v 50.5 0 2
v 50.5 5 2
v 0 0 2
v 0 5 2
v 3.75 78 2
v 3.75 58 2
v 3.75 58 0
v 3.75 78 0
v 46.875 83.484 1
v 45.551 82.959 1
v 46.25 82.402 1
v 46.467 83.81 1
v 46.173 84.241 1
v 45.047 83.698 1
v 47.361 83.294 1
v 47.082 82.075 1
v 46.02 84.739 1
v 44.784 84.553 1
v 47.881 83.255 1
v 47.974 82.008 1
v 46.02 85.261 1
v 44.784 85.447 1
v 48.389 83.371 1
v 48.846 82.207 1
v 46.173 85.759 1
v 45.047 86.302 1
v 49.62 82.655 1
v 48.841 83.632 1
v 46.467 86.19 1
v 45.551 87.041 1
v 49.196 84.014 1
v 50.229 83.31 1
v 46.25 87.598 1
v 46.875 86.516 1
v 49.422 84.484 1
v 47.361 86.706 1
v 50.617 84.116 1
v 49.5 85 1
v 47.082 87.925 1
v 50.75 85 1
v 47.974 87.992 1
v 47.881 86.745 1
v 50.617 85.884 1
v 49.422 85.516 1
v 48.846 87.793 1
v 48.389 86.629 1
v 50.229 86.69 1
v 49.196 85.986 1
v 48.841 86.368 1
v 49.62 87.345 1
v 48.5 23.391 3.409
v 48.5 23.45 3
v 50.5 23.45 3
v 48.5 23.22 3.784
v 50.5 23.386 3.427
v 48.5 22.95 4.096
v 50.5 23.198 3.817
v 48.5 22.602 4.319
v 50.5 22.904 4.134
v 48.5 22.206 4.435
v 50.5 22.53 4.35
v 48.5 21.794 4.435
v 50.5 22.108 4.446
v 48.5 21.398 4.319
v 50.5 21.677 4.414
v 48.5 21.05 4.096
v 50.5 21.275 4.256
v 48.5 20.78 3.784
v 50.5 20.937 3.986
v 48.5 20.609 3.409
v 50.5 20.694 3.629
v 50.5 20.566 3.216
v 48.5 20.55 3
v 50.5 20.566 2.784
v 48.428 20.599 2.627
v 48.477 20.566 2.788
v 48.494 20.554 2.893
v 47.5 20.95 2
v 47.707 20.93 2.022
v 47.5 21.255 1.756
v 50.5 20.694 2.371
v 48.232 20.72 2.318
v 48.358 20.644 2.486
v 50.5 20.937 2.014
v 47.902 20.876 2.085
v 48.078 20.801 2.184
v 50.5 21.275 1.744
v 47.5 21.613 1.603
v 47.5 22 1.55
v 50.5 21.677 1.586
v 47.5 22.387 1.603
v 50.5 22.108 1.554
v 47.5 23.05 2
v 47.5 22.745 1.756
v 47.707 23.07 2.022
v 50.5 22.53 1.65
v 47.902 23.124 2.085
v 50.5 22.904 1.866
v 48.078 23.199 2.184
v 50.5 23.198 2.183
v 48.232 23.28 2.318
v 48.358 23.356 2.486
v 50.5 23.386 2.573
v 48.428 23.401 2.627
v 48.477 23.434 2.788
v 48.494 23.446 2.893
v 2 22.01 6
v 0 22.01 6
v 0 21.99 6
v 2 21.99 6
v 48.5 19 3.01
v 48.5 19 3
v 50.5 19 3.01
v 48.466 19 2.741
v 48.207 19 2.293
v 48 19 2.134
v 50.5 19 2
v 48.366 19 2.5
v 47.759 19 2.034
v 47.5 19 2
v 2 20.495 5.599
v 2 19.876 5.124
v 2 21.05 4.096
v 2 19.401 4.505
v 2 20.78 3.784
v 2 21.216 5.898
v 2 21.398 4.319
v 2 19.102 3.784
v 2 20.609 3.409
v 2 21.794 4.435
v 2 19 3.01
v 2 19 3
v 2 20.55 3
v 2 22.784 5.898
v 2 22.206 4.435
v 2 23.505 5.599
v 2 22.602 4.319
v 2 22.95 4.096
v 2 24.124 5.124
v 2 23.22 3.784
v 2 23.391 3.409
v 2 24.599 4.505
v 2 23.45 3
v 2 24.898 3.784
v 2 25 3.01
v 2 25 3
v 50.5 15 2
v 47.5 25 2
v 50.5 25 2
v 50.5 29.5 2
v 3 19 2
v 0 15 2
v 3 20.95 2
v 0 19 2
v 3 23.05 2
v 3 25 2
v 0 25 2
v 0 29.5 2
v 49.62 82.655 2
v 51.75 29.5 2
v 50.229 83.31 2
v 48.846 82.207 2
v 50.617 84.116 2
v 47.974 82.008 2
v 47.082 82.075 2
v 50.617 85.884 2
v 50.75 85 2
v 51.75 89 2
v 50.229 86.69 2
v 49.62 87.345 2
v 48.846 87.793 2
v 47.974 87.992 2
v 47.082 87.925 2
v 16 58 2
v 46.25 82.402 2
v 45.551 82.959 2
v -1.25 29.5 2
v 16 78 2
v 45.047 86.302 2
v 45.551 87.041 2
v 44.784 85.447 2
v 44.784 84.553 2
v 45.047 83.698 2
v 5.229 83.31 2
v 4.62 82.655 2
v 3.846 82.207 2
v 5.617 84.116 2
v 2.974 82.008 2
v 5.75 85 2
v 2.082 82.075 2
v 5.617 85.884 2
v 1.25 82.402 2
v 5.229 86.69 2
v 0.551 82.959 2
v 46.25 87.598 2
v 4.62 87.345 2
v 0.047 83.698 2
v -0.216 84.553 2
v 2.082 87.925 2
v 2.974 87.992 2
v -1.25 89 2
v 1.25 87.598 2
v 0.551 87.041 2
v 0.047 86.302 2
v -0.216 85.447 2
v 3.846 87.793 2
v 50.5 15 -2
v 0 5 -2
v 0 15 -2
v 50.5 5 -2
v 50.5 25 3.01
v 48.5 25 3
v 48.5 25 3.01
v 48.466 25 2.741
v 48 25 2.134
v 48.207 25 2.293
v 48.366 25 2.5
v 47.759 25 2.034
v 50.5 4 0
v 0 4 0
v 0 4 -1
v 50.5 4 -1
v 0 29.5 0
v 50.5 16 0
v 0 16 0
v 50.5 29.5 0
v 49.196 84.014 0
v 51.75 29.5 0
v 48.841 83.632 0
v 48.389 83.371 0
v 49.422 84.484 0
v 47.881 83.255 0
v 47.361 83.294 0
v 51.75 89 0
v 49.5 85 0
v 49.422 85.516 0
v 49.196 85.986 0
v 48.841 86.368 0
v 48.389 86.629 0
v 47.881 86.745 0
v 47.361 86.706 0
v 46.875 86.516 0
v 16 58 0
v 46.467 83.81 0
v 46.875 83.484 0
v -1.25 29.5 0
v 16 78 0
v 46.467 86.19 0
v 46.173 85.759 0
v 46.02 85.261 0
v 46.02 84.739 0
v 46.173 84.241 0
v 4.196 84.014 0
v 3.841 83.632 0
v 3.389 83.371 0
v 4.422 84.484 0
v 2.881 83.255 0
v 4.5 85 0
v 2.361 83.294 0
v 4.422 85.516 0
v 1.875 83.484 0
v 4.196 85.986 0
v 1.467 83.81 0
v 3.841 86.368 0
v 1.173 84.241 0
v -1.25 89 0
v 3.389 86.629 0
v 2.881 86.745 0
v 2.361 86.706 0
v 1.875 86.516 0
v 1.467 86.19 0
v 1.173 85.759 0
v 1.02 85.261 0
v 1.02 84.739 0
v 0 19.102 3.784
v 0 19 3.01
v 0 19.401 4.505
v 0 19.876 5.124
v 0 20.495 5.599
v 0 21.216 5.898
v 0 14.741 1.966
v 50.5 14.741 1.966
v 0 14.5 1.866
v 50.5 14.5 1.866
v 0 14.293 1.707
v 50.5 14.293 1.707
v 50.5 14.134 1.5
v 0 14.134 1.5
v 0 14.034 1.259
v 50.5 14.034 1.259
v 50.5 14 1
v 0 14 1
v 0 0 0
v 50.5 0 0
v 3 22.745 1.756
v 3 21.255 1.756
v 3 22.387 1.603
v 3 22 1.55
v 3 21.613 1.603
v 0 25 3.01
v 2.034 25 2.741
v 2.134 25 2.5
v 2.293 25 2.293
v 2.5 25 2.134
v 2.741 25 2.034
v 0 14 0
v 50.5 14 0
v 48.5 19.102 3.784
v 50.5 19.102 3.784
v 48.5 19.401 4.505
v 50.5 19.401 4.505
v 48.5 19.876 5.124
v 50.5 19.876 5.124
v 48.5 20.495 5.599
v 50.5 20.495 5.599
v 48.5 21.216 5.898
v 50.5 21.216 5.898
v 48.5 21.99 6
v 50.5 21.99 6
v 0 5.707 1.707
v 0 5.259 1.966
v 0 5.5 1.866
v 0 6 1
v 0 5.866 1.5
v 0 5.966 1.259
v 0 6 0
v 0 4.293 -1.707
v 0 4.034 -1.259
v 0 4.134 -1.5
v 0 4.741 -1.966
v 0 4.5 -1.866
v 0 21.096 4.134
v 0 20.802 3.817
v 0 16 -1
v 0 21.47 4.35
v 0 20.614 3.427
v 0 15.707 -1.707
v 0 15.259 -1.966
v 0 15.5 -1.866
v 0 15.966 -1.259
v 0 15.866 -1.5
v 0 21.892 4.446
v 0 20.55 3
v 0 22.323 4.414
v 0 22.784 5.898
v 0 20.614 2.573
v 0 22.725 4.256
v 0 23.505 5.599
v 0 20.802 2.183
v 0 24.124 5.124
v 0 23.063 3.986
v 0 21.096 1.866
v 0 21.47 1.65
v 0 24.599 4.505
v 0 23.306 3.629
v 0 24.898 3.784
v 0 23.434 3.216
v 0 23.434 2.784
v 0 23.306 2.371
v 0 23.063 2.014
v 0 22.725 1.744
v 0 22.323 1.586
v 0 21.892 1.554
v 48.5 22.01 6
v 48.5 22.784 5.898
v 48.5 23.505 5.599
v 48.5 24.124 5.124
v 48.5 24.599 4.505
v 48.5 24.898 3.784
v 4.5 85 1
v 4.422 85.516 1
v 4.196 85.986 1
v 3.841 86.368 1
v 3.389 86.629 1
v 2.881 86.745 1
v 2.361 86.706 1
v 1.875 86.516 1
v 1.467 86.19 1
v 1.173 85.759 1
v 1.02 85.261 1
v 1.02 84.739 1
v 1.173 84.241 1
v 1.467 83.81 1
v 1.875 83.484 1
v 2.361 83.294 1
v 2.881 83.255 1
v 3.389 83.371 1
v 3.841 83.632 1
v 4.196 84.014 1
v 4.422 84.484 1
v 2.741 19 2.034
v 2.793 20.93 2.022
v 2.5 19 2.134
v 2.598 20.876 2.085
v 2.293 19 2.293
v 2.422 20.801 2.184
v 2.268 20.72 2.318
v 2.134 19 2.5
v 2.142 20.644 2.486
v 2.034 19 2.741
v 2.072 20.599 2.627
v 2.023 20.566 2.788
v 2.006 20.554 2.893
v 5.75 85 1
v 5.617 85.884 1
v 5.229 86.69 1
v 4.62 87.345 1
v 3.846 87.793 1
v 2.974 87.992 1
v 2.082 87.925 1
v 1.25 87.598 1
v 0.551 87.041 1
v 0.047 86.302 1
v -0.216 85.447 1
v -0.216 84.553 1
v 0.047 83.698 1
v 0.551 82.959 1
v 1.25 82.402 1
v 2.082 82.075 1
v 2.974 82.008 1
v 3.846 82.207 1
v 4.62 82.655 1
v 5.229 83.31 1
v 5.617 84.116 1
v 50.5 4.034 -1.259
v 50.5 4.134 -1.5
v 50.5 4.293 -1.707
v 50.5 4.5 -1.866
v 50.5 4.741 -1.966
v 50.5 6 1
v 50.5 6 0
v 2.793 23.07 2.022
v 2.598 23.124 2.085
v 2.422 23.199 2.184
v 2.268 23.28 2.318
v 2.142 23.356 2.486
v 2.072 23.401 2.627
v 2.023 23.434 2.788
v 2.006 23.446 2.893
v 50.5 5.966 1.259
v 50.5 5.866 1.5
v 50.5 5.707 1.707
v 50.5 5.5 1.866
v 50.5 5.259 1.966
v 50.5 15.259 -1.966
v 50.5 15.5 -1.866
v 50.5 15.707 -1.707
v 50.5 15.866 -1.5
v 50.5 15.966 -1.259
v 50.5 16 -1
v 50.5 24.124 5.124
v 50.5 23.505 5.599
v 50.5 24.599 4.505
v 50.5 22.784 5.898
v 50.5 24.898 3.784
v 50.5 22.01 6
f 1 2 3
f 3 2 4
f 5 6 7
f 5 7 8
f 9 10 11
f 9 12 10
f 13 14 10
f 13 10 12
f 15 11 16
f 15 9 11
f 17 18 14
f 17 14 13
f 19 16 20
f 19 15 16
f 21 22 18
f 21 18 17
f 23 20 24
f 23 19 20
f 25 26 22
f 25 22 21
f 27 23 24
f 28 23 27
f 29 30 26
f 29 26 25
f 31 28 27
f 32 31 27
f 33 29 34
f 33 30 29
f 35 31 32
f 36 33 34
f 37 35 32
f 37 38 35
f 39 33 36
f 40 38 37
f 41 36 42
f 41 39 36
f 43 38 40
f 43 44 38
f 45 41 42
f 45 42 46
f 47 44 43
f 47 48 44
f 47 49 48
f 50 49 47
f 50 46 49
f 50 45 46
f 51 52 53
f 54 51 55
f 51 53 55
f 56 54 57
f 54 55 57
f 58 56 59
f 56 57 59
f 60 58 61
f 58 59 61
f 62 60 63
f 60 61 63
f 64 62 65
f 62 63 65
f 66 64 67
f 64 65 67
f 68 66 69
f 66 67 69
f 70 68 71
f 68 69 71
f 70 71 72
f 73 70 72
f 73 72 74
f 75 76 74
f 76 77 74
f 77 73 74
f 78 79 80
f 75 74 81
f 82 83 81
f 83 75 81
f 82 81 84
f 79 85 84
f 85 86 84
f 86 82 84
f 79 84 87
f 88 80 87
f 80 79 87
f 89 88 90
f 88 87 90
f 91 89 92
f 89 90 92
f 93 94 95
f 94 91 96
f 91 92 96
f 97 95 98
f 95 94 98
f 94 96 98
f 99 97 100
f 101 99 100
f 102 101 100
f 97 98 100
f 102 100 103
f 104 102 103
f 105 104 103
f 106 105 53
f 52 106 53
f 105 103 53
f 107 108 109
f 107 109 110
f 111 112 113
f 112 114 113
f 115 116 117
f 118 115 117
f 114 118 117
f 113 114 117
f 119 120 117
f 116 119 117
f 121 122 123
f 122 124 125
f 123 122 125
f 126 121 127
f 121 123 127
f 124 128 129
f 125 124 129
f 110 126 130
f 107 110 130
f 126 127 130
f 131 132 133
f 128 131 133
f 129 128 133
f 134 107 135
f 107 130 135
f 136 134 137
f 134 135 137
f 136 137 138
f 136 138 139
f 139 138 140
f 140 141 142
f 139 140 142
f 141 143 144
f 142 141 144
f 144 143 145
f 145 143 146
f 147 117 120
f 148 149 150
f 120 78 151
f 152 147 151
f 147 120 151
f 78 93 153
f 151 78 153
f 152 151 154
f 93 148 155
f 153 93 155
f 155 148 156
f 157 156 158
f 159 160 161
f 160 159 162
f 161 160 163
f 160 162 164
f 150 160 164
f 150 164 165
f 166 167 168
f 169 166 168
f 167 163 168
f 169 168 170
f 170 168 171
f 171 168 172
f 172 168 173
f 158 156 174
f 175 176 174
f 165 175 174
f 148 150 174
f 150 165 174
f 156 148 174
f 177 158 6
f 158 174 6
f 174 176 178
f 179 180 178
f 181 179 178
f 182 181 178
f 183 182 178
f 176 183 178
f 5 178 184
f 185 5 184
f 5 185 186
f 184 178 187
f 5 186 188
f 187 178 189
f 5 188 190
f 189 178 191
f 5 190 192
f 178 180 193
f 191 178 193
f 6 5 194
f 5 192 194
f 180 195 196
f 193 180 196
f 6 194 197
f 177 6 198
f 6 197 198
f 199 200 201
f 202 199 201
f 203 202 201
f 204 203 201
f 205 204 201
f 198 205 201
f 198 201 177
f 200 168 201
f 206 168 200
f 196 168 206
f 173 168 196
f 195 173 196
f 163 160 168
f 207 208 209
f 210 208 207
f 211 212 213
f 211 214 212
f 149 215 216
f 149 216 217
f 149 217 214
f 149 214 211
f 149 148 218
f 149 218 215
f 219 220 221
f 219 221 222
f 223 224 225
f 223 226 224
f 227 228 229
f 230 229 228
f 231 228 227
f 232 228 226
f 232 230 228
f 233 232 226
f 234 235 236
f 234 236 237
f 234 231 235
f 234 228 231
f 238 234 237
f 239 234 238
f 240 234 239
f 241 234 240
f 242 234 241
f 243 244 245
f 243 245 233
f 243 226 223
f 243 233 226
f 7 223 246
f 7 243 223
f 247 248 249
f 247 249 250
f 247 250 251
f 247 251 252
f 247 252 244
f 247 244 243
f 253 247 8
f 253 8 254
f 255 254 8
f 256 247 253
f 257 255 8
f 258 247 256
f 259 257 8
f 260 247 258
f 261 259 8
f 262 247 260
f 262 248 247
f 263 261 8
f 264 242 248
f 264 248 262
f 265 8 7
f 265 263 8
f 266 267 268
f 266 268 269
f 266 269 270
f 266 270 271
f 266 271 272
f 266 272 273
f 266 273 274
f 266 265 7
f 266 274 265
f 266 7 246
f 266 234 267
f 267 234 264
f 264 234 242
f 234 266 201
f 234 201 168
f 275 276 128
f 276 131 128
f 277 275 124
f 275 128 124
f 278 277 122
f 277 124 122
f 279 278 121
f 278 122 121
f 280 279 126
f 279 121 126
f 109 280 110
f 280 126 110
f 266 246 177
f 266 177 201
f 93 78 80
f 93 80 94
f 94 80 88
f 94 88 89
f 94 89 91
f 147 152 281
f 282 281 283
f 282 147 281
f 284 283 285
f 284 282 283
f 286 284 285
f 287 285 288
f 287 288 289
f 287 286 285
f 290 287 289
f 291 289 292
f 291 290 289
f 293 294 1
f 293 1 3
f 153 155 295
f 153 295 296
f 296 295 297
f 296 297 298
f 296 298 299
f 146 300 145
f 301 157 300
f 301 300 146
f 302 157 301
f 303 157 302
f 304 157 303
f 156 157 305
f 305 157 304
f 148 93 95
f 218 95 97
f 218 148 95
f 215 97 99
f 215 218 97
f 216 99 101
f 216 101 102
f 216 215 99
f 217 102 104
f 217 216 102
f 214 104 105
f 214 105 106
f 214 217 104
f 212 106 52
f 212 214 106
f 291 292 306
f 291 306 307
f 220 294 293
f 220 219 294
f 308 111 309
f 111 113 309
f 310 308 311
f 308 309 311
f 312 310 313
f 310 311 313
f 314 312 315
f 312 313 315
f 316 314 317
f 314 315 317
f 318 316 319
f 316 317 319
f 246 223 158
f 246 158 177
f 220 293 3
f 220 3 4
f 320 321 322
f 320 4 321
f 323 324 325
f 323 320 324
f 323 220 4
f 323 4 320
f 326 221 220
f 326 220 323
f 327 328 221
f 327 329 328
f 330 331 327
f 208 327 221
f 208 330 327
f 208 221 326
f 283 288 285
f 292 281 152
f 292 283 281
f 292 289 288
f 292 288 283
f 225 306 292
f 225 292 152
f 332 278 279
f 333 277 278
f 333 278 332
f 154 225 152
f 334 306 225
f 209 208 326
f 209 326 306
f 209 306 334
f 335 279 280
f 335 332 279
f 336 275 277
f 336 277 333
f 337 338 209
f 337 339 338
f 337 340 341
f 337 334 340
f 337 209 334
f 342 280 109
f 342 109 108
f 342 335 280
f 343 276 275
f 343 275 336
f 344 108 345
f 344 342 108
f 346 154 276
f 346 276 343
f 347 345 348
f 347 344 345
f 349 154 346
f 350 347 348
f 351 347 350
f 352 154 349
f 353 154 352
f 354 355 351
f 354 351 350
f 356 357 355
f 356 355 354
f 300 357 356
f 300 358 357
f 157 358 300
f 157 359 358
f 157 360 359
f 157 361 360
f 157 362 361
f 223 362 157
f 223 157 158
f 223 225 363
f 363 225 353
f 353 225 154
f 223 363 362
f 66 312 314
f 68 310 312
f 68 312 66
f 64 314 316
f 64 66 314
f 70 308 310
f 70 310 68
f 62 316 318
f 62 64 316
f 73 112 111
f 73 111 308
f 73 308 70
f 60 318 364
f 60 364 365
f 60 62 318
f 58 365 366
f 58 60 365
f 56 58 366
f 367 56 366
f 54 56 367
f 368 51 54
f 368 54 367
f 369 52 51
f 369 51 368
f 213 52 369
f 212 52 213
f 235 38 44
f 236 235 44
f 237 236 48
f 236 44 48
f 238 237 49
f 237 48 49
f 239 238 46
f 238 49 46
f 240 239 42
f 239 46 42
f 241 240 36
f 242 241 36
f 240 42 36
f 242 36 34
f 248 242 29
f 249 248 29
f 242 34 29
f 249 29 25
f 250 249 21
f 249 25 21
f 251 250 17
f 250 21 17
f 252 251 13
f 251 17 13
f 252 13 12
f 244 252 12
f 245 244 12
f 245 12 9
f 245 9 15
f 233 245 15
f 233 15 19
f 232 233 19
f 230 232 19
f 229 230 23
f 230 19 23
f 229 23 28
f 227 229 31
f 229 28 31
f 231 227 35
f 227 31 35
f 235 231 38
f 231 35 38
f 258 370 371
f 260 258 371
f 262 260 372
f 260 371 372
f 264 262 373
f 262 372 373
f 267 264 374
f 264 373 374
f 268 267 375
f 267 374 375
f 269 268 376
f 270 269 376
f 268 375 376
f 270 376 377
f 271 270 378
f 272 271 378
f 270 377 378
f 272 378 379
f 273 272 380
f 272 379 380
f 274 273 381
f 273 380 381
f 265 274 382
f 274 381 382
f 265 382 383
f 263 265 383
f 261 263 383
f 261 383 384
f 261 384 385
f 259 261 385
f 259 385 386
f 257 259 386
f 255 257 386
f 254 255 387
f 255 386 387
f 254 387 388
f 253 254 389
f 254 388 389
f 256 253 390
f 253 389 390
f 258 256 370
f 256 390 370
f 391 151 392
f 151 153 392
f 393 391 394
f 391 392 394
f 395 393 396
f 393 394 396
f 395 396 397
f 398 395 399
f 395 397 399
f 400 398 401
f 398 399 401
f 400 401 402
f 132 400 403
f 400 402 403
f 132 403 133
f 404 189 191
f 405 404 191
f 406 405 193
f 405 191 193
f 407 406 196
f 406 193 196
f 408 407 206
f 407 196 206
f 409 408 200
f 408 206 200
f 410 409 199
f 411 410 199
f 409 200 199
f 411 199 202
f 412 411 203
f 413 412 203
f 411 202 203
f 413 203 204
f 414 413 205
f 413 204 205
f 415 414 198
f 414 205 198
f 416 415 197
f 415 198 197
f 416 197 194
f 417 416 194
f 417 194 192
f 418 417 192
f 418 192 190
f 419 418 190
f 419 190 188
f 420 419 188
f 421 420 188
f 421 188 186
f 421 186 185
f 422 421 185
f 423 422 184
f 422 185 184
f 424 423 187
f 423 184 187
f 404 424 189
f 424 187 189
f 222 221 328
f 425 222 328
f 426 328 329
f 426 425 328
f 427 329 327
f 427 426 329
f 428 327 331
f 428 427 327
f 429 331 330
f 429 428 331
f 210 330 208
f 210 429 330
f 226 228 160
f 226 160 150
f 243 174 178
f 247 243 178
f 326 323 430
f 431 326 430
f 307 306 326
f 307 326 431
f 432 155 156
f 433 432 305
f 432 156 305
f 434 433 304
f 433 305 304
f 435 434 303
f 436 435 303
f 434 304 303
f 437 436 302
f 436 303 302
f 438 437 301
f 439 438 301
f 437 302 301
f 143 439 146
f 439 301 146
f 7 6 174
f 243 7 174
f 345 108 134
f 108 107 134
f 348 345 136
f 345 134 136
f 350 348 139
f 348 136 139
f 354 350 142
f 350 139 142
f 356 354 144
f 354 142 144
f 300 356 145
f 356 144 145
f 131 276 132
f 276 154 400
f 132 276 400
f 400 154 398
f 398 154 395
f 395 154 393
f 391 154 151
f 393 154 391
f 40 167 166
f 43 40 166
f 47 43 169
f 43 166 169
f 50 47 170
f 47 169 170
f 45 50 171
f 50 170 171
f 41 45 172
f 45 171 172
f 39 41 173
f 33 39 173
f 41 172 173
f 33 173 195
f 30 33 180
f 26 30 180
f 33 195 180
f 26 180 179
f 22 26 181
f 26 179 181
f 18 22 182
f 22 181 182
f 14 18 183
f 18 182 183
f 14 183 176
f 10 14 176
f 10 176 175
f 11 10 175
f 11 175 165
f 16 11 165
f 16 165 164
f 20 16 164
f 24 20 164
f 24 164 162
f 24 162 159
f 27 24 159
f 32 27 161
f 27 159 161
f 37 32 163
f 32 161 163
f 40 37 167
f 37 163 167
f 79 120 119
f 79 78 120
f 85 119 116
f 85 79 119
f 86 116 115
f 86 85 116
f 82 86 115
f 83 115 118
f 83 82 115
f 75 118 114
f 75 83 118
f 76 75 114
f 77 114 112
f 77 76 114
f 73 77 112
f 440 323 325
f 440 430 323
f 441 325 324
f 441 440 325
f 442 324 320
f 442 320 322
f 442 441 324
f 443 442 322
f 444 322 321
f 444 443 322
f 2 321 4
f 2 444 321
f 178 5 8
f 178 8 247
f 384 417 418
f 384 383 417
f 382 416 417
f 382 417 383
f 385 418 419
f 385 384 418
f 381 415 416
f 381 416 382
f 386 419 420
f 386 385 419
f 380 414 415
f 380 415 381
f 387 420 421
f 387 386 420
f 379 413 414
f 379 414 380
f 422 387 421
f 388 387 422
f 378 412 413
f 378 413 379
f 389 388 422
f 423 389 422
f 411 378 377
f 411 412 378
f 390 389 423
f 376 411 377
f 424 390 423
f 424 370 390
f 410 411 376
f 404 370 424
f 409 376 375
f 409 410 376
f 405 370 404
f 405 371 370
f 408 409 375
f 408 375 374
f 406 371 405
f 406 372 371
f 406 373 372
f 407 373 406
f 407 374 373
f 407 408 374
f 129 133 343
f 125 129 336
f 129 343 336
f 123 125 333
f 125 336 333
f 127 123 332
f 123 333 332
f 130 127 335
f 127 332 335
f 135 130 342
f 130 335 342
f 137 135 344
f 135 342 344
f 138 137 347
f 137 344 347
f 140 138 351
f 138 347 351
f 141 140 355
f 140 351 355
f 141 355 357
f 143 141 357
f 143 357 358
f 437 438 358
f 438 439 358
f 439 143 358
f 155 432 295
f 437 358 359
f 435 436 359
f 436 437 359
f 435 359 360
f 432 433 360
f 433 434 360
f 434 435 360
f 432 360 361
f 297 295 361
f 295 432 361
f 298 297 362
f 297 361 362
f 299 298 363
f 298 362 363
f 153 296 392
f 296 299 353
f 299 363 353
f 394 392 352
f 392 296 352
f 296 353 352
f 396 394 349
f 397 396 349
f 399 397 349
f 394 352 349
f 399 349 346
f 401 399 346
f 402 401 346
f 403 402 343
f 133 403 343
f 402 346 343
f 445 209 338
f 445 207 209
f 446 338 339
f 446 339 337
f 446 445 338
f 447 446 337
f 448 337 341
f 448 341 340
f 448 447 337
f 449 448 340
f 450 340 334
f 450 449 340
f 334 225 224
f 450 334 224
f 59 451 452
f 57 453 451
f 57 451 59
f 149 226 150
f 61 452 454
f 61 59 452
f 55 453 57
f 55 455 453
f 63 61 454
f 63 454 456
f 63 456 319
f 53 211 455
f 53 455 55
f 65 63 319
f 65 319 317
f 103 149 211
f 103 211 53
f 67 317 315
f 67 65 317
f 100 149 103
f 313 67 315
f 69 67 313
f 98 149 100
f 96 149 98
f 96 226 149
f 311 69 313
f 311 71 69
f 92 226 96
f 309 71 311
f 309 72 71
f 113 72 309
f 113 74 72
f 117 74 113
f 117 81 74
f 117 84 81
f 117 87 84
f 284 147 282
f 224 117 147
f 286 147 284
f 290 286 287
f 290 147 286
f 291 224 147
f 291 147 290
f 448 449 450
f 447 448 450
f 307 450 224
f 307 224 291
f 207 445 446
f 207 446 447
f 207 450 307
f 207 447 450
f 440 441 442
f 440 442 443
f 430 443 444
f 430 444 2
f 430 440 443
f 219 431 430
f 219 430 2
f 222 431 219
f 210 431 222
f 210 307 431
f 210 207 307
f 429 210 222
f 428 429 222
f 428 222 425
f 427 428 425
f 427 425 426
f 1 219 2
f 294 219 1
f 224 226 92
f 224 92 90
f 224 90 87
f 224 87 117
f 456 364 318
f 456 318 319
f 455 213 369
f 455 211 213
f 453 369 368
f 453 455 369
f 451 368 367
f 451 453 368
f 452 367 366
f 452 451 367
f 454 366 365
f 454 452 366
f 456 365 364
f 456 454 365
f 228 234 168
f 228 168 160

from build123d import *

# Parameters (mm, degrees)
PAD_DEPTH       = 2
SKETCH001_R     = 3
POCKET_DEPTH    = 1
SKETCH002_R     = 1.75
POCKET001_DEPTH = 1
SKETCH003_W     = 2
SKETCH003_H     = 6
PAD001_DEPTH    = 4
SKETCH004_R     = 1.45
POCKET002_DEPTH = 3
SKETCH005_R     = 1.45
POCKET003_DEPTH = 3
FILLET_R        = 2.99
FILLET001_R     = 1
SKETCH006_W     = 12.25
SKETCH006_H     = 20
POCKET004_DEPTH = 2
SKETCH007_W     = 50.5
SKETCH007_H     = 12
PAD002_DEPTH    = 2
SKETCH008_W     = 50.5
SKETCH008_H     = 8
POCKET005_DEPTH = 2
FILLET002_R     = 1


with BuildPart() as part:
    # Sketch → Pad (new body)
    with BuildSketch(Plane.XY):
        Polygon((0, 0), (0, 29.5), (-1.25, 29.5), (-1.25, 89), (51.75, 89), (51.75, 29.5), (50.5, 29.5), (50.5, 0), align=None)
    extrude(amount=PAD_DEPTH)

    # Sketch001 (on Face10 of Pad) → Pocket (cut)
    with BuildSketch(Plane.XY.offset(2)):
        with Locations((2.75, 85)):
            Circle(SKETCH001_R)
        with Locations((47.75, 85)):
            Circle(SKETCH001_R)
    extrude(amount=-POCKET_DEPTH, mode=Mode.SUBTRACT)

    # Sketch002 (on Face13 of Pocket) → Pocket001 (cut)
    with BuildSketch(Plane.XY.offset(1)):
        with Locations((2.75, 85)):
            Circle(SKETCH002_R)
        with Locations((47.75, 85)):
            Circle(SKETCH002_R)
    extrude(amount=-POCKET001_DEPTH, mode=Mode.SUBTRACT)

    # Sketch003 (on Face5 of Pocket001) → Pad001 (join)
    with BuildSketch(Plane.XY.offset(2)):
        with Locations((1, 22)):
            Rectangle(SKETCH003_W, SKETCH003_H)
        with Locations((49.5, 22)):
            Rectangle(SKETCH003_W, SKETCH003_H)
    extrude(amount=PAD001_DEPTH)

    # Sketch004 (on Face6 of Pad001) → Pocket002 (cut)
    with BuildSketch(Plane(origin=(0, 0, 0), x_dir=(0, -1, 0), z_dir=(-1, 0, 0))):
        with Locations((-22, 3)):
            Circle(SKETCH004_R)
    extrude(amount=-POCKET002_DEPTH, mode=Mode.SUBTRACT)

    # Sketch005 (on Face25 of Pocket002) → Pocket003 (cut)
    with BuildSketch(Plane.YZ.offset(50.5)):
        with Locations((22, 3)):
            Circle(SKETCH005_R)
    extrude(amount=-POCKET003_DEPTH, mode=Mode.SUBTRACT)

    # Fillet
    fillet_edges = [part.edges().sort_by_distance(p)[0] for p in [
        (1, 25, 6),
        (1, 19, 6),
        (49.5, 19, 6),
        (49.5, 25, 6),
    ]]
    fillet(fillet_edges, radius=FILLET_R)

    # Fillet001
    fillet001_edges = [part.edges().sort_by_distance(p)[0] for p in [
        (2, 19.975, 2),
        (2, 24.025, 2),
        (48.5, 19.975, 2),
        (48.5, 24.025, 2),
    ]]
    fillet(fillet001_edges, radius=FILLET001_R)

    # Sketch006 (on Face5 of Fillet001) → Pocket004 (cut)
    with BuildSketch(Plane.XY.offset(2)):
        with Locations((9.875, 68)):
            Rectangle(SKETCH006_W, SKETCH006_H)
    extrude(amount=-POCKET004_DEPTH, mode=Mode.SUBTRACT)

    # Sketch007 (on Face32 of Pocket004) → Pad002 (join)
    with BuildSketch(Plane(origin=(0, 0, 0), x_dir=(1, 0, 0), z_dir=(0, 0, -1))):
        with Locations((25.25, -10)):
            Rectangle(SKETCH007_W, SKETCH007_H)
    extrude(amount=PAD002_DEPTH)

    # Sketch008 (on Face5 of Pad002) → Pocket005 (cut)
    with BuildSketch(Plane.XY.offset(2)):
        with Locations((25.25, 10)):
            Rectangle(SKETCH008_W, SKETCH008_H)
    extrude(amount=-POCKET005_DEPTH, mode=Mode.SUBTRACT)

    # Fillet002
    fillet002_edges = [part.edges().sort_by_distance(p)[0] for p in [
        (25.25, 14, 2),
        (25.25, 6, 2),
        (25.25, 16, -2),
        (25.25, 4, -2),
    ]]
    fillet(fillet002_edges, radius=FILLET002_R)


solid = part.part
